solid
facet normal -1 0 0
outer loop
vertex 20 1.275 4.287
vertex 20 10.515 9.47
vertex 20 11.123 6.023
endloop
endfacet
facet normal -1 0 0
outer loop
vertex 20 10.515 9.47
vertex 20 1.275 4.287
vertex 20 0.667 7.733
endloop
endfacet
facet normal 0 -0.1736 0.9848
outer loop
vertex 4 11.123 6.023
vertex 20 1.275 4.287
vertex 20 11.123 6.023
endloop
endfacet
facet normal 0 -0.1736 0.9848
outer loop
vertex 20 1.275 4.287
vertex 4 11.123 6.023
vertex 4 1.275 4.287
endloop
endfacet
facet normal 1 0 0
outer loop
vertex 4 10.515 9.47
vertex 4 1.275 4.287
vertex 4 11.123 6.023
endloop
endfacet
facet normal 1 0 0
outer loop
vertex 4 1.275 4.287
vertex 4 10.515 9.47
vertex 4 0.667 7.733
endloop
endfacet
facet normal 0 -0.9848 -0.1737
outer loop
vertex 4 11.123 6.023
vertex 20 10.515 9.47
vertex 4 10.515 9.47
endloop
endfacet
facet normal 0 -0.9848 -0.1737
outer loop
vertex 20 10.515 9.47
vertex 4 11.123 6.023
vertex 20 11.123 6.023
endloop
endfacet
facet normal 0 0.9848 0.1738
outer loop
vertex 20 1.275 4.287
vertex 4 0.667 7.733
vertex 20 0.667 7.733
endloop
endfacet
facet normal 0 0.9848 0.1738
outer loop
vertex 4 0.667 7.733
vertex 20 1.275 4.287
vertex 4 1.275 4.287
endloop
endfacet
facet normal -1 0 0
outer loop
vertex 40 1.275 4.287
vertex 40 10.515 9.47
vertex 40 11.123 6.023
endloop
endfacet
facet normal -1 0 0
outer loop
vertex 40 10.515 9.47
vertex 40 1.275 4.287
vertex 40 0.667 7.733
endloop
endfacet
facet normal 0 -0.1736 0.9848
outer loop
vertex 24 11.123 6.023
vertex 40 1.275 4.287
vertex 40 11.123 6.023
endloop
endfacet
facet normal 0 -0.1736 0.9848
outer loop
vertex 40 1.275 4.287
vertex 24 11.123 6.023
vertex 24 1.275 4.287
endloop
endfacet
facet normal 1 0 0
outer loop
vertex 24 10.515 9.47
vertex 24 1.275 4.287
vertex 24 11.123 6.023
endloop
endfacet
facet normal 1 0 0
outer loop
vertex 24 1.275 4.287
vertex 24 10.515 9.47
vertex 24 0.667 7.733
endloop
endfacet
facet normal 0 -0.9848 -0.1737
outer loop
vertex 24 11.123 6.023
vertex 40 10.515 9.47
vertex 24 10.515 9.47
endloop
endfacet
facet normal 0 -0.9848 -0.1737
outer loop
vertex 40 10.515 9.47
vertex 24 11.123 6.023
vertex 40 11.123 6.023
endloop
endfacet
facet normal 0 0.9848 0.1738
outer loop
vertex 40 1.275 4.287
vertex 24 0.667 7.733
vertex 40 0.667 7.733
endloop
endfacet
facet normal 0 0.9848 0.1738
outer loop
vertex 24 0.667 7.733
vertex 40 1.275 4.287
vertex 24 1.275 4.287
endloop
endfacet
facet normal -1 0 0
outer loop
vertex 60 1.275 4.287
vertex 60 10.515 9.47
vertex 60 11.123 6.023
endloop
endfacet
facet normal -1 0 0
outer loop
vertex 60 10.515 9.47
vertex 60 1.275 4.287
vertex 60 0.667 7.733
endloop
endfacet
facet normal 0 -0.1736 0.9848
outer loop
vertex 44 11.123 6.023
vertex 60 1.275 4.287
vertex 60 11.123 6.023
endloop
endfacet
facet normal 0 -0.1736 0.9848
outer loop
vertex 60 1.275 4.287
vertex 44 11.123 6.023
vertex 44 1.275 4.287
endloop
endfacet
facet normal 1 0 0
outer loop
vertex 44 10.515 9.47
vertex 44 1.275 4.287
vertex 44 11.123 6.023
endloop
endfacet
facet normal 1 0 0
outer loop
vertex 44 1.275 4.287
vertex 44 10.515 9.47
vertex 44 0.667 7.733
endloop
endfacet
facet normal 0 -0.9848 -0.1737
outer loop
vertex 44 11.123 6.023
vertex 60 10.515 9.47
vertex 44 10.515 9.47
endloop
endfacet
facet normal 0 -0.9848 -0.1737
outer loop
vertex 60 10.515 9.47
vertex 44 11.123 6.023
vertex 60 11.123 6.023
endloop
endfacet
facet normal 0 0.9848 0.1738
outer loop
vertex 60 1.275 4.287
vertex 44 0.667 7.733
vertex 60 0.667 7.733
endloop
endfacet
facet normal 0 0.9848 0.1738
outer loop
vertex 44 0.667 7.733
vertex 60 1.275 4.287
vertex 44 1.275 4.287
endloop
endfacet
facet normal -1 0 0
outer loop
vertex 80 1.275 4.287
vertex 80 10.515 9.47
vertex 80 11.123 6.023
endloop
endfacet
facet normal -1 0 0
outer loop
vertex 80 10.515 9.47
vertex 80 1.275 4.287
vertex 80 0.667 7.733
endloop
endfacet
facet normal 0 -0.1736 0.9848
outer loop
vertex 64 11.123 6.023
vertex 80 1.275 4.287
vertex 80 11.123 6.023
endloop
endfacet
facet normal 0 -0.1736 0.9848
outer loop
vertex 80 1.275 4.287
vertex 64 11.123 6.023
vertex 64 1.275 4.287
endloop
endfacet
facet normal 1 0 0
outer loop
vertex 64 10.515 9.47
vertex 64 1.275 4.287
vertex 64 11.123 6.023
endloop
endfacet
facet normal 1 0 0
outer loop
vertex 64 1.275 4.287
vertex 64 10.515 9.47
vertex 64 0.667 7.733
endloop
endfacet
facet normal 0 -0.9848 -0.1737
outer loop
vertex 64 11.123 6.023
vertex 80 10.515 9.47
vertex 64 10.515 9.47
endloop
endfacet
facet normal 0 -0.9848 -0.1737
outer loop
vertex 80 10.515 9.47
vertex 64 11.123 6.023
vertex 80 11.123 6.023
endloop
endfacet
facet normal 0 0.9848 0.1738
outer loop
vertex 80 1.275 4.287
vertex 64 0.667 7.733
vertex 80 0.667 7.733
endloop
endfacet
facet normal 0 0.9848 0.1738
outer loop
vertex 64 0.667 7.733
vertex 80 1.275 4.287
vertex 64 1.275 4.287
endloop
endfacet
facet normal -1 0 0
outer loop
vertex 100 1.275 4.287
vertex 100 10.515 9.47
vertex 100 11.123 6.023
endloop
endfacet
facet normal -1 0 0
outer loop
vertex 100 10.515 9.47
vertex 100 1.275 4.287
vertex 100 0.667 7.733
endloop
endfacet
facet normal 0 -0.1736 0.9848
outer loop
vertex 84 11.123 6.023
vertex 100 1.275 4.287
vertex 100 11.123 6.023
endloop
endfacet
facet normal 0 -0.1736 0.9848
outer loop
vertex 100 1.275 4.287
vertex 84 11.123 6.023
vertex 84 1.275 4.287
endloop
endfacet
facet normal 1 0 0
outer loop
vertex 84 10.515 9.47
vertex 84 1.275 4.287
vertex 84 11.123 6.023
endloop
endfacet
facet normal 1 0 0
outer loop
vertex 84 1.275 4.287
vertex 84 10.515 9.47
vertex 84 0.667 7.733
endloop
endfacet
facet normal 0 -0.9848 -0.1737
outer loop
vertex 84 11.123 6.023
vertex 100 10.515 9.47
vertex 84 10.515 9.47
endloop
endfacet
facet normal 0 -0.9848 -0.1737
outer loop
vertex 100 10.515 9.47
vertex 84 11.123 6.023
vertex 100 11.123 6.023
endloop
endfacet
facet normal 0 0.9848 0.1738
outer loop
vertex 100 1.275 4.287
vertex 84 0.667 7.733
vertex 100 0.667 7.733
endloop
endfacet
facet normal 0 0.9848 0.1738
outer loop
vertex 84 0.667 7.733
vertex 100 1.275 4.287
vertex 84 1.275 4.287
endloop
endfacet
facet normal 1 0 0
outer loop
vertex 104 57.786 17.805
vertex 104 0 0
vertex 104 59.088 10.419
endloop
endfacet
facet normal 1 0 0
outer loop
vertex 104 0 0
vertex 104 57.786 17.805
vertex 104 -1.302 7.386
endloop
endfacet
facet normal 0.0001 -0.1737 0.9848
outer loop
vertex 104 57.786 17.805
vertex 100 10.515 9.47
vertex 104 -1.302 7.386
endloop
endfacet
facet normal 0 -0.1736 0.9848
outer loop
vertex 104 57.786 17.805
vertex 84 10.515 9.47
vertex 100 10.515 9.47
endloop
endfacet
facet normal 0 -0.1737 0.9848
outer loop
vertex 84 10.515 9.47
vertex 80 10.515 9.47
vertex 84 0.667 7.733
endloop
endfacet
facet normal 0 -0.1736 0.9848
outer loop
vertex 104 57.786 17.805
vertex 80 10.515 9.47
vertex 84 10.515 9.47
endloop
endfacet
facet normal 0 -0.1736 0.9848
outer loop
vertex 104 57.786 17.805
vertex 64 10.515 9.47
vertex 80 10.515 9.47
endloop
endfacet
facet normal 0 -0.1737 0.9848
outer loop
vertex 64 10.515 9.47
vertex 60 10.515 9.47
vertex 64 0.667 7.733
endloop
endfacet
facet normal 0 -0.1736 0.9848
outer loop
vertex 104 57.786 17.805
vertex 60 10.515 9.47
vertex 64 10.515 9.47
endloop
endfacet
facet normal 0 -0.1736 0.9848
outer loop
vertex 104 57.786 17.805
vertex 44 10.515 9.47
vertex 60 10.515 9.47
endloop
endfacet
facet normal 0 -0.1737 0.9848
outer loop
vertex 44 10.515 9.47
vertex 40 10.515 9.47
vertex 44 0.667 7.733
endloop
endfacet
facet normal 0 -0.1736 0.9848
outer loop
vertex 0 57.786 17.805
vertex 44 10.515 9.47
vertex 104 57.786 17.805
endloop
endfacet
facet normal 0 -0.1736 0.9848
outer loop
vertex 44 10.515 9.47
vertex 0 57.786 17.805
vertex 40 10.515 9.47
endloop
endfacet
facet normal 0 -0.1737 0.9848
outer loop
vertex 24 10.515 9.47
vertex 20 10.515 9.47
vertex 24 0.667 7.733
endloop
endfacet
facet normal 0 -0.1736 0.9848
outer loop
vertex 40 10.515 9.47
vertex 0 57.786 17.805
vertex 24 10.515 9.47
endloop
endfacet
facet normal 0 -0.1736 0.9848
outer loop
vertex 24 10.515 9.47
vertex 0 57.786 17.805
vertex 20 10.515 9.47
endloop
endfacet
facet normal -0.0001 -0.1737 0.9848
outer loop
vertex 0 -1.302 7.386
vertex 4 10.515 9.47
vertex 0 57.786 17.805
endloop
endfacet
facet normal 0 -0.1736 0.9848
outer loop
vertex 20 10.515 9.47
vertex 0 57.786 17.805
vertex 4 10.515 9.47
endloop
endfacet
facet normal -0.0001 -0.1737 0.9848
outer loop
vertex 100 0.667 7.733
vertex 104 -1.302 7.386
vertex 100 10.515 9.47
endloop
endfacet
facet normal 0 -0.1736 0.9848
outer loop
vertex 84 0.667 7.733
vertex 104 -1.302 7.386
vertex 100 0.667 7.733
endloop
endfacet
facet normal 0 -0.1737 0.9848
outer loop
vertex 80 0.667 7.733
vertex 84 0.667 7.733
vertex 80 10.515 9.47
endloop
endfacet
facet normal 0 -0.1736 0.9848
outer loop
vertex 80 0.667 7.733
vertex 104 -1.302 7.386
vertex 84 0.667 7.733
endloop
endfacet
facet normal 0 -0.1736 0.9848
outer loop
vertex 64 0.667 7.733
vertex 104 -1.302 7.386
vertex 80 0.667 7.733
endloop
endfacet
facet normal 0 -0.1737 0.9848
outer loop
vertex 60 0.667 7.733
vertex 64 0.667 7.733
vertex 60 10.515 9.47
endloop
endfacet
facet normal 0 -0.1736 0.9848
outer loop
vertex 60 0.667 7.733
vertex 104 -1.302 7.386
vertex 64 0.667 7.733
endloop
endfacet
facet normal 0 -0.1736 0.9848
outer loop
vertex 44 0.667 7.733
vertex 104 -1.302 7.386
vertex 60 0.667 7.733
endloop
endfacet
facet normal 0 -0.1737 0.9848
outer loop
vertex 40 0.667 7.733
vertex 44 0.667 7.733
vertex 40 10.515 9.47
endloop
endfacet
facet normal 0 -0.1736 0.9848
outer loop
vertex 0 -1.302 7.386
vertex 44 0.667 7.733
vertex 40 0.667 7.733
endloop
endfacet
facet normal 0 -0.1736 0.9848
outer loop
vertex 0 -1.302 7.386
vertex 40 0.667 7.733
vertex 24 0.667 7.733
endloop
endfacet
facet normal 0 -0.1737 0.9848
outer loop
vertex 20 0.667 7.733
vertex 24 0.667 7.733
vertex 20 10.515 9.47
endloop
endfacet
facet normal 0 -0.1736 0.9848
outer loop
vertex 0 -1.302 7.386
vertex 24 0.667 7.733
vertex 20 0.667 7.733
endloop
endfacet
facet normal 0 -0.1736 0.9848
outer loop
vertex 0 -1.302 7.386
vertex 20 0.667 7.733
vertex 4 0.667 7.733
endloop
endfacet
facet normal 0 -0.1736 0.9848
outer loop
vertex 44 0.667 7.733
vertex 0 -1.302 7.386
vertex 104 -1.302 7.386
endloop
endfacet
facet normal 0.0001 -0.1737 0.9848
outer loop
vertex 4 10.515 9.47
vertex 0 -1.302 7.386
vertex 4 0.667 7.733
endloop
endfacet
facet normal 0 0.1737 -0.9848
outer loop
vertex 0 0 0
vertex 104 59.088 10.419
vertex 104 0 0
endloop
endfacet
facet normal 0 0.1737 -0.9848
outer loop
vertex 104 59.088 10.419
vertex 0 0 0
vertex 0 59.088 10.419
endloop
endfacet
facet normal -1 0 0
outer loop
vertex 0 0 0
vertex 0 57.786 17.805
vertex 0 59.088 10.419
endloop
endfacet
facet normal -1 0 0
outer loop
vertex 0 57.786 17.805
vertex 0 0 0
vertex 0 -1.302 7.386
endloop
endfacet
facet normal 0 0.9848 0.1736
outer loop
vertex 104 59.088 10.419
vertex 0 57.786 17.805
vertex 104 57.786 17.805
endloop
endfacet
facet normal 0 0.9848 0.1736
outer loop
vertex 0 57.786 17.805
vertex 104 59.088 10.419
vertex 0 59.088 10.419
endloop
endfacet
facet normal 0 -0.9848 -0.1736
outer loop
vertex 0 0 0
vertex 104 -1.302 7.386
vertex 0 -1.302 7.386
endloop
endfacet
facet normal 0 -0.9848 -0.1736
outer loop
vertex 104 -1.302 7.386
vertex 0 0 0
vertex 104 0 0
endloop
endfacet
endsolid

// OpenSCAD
// LEGO Minifigure Display Stand
// Holds 5 minifigs in a row, angled 10° back for display
// Print: 0.2mm, 3 walls, 15% infill, no supports needed

count     = 5;    // Number of minifig slots
tilt_deg  = 10;   // Backward tilt

SLOT_W  = 16.0;
SLOT_D  = 10.0;
SLOT_H  = 3.5;    // Depth minifig feet sink in
BASE_H  = 4.0;
WALL_T  = 2.0;
SPACING = 20.0;

total_W = count * SPACING + WALL_T * 2;
total_D = 60.0;
total_H = BASE_H + SLOT_H;

module slot() {
    translate([SPACING/2 - SLOT_W/2, WALL_T, BASE_H])
        cube([SLOT_W, SLOT_D, SLOT_H + 1]);
}

rotate([tilt_deg, 0, 0])
difference() {
    cube([total_W, total_D, total_H]);
    for (i = [0 : count - 1])
        translate([i * SPACING + WALL_T, 0, 0])
            slot();
}
